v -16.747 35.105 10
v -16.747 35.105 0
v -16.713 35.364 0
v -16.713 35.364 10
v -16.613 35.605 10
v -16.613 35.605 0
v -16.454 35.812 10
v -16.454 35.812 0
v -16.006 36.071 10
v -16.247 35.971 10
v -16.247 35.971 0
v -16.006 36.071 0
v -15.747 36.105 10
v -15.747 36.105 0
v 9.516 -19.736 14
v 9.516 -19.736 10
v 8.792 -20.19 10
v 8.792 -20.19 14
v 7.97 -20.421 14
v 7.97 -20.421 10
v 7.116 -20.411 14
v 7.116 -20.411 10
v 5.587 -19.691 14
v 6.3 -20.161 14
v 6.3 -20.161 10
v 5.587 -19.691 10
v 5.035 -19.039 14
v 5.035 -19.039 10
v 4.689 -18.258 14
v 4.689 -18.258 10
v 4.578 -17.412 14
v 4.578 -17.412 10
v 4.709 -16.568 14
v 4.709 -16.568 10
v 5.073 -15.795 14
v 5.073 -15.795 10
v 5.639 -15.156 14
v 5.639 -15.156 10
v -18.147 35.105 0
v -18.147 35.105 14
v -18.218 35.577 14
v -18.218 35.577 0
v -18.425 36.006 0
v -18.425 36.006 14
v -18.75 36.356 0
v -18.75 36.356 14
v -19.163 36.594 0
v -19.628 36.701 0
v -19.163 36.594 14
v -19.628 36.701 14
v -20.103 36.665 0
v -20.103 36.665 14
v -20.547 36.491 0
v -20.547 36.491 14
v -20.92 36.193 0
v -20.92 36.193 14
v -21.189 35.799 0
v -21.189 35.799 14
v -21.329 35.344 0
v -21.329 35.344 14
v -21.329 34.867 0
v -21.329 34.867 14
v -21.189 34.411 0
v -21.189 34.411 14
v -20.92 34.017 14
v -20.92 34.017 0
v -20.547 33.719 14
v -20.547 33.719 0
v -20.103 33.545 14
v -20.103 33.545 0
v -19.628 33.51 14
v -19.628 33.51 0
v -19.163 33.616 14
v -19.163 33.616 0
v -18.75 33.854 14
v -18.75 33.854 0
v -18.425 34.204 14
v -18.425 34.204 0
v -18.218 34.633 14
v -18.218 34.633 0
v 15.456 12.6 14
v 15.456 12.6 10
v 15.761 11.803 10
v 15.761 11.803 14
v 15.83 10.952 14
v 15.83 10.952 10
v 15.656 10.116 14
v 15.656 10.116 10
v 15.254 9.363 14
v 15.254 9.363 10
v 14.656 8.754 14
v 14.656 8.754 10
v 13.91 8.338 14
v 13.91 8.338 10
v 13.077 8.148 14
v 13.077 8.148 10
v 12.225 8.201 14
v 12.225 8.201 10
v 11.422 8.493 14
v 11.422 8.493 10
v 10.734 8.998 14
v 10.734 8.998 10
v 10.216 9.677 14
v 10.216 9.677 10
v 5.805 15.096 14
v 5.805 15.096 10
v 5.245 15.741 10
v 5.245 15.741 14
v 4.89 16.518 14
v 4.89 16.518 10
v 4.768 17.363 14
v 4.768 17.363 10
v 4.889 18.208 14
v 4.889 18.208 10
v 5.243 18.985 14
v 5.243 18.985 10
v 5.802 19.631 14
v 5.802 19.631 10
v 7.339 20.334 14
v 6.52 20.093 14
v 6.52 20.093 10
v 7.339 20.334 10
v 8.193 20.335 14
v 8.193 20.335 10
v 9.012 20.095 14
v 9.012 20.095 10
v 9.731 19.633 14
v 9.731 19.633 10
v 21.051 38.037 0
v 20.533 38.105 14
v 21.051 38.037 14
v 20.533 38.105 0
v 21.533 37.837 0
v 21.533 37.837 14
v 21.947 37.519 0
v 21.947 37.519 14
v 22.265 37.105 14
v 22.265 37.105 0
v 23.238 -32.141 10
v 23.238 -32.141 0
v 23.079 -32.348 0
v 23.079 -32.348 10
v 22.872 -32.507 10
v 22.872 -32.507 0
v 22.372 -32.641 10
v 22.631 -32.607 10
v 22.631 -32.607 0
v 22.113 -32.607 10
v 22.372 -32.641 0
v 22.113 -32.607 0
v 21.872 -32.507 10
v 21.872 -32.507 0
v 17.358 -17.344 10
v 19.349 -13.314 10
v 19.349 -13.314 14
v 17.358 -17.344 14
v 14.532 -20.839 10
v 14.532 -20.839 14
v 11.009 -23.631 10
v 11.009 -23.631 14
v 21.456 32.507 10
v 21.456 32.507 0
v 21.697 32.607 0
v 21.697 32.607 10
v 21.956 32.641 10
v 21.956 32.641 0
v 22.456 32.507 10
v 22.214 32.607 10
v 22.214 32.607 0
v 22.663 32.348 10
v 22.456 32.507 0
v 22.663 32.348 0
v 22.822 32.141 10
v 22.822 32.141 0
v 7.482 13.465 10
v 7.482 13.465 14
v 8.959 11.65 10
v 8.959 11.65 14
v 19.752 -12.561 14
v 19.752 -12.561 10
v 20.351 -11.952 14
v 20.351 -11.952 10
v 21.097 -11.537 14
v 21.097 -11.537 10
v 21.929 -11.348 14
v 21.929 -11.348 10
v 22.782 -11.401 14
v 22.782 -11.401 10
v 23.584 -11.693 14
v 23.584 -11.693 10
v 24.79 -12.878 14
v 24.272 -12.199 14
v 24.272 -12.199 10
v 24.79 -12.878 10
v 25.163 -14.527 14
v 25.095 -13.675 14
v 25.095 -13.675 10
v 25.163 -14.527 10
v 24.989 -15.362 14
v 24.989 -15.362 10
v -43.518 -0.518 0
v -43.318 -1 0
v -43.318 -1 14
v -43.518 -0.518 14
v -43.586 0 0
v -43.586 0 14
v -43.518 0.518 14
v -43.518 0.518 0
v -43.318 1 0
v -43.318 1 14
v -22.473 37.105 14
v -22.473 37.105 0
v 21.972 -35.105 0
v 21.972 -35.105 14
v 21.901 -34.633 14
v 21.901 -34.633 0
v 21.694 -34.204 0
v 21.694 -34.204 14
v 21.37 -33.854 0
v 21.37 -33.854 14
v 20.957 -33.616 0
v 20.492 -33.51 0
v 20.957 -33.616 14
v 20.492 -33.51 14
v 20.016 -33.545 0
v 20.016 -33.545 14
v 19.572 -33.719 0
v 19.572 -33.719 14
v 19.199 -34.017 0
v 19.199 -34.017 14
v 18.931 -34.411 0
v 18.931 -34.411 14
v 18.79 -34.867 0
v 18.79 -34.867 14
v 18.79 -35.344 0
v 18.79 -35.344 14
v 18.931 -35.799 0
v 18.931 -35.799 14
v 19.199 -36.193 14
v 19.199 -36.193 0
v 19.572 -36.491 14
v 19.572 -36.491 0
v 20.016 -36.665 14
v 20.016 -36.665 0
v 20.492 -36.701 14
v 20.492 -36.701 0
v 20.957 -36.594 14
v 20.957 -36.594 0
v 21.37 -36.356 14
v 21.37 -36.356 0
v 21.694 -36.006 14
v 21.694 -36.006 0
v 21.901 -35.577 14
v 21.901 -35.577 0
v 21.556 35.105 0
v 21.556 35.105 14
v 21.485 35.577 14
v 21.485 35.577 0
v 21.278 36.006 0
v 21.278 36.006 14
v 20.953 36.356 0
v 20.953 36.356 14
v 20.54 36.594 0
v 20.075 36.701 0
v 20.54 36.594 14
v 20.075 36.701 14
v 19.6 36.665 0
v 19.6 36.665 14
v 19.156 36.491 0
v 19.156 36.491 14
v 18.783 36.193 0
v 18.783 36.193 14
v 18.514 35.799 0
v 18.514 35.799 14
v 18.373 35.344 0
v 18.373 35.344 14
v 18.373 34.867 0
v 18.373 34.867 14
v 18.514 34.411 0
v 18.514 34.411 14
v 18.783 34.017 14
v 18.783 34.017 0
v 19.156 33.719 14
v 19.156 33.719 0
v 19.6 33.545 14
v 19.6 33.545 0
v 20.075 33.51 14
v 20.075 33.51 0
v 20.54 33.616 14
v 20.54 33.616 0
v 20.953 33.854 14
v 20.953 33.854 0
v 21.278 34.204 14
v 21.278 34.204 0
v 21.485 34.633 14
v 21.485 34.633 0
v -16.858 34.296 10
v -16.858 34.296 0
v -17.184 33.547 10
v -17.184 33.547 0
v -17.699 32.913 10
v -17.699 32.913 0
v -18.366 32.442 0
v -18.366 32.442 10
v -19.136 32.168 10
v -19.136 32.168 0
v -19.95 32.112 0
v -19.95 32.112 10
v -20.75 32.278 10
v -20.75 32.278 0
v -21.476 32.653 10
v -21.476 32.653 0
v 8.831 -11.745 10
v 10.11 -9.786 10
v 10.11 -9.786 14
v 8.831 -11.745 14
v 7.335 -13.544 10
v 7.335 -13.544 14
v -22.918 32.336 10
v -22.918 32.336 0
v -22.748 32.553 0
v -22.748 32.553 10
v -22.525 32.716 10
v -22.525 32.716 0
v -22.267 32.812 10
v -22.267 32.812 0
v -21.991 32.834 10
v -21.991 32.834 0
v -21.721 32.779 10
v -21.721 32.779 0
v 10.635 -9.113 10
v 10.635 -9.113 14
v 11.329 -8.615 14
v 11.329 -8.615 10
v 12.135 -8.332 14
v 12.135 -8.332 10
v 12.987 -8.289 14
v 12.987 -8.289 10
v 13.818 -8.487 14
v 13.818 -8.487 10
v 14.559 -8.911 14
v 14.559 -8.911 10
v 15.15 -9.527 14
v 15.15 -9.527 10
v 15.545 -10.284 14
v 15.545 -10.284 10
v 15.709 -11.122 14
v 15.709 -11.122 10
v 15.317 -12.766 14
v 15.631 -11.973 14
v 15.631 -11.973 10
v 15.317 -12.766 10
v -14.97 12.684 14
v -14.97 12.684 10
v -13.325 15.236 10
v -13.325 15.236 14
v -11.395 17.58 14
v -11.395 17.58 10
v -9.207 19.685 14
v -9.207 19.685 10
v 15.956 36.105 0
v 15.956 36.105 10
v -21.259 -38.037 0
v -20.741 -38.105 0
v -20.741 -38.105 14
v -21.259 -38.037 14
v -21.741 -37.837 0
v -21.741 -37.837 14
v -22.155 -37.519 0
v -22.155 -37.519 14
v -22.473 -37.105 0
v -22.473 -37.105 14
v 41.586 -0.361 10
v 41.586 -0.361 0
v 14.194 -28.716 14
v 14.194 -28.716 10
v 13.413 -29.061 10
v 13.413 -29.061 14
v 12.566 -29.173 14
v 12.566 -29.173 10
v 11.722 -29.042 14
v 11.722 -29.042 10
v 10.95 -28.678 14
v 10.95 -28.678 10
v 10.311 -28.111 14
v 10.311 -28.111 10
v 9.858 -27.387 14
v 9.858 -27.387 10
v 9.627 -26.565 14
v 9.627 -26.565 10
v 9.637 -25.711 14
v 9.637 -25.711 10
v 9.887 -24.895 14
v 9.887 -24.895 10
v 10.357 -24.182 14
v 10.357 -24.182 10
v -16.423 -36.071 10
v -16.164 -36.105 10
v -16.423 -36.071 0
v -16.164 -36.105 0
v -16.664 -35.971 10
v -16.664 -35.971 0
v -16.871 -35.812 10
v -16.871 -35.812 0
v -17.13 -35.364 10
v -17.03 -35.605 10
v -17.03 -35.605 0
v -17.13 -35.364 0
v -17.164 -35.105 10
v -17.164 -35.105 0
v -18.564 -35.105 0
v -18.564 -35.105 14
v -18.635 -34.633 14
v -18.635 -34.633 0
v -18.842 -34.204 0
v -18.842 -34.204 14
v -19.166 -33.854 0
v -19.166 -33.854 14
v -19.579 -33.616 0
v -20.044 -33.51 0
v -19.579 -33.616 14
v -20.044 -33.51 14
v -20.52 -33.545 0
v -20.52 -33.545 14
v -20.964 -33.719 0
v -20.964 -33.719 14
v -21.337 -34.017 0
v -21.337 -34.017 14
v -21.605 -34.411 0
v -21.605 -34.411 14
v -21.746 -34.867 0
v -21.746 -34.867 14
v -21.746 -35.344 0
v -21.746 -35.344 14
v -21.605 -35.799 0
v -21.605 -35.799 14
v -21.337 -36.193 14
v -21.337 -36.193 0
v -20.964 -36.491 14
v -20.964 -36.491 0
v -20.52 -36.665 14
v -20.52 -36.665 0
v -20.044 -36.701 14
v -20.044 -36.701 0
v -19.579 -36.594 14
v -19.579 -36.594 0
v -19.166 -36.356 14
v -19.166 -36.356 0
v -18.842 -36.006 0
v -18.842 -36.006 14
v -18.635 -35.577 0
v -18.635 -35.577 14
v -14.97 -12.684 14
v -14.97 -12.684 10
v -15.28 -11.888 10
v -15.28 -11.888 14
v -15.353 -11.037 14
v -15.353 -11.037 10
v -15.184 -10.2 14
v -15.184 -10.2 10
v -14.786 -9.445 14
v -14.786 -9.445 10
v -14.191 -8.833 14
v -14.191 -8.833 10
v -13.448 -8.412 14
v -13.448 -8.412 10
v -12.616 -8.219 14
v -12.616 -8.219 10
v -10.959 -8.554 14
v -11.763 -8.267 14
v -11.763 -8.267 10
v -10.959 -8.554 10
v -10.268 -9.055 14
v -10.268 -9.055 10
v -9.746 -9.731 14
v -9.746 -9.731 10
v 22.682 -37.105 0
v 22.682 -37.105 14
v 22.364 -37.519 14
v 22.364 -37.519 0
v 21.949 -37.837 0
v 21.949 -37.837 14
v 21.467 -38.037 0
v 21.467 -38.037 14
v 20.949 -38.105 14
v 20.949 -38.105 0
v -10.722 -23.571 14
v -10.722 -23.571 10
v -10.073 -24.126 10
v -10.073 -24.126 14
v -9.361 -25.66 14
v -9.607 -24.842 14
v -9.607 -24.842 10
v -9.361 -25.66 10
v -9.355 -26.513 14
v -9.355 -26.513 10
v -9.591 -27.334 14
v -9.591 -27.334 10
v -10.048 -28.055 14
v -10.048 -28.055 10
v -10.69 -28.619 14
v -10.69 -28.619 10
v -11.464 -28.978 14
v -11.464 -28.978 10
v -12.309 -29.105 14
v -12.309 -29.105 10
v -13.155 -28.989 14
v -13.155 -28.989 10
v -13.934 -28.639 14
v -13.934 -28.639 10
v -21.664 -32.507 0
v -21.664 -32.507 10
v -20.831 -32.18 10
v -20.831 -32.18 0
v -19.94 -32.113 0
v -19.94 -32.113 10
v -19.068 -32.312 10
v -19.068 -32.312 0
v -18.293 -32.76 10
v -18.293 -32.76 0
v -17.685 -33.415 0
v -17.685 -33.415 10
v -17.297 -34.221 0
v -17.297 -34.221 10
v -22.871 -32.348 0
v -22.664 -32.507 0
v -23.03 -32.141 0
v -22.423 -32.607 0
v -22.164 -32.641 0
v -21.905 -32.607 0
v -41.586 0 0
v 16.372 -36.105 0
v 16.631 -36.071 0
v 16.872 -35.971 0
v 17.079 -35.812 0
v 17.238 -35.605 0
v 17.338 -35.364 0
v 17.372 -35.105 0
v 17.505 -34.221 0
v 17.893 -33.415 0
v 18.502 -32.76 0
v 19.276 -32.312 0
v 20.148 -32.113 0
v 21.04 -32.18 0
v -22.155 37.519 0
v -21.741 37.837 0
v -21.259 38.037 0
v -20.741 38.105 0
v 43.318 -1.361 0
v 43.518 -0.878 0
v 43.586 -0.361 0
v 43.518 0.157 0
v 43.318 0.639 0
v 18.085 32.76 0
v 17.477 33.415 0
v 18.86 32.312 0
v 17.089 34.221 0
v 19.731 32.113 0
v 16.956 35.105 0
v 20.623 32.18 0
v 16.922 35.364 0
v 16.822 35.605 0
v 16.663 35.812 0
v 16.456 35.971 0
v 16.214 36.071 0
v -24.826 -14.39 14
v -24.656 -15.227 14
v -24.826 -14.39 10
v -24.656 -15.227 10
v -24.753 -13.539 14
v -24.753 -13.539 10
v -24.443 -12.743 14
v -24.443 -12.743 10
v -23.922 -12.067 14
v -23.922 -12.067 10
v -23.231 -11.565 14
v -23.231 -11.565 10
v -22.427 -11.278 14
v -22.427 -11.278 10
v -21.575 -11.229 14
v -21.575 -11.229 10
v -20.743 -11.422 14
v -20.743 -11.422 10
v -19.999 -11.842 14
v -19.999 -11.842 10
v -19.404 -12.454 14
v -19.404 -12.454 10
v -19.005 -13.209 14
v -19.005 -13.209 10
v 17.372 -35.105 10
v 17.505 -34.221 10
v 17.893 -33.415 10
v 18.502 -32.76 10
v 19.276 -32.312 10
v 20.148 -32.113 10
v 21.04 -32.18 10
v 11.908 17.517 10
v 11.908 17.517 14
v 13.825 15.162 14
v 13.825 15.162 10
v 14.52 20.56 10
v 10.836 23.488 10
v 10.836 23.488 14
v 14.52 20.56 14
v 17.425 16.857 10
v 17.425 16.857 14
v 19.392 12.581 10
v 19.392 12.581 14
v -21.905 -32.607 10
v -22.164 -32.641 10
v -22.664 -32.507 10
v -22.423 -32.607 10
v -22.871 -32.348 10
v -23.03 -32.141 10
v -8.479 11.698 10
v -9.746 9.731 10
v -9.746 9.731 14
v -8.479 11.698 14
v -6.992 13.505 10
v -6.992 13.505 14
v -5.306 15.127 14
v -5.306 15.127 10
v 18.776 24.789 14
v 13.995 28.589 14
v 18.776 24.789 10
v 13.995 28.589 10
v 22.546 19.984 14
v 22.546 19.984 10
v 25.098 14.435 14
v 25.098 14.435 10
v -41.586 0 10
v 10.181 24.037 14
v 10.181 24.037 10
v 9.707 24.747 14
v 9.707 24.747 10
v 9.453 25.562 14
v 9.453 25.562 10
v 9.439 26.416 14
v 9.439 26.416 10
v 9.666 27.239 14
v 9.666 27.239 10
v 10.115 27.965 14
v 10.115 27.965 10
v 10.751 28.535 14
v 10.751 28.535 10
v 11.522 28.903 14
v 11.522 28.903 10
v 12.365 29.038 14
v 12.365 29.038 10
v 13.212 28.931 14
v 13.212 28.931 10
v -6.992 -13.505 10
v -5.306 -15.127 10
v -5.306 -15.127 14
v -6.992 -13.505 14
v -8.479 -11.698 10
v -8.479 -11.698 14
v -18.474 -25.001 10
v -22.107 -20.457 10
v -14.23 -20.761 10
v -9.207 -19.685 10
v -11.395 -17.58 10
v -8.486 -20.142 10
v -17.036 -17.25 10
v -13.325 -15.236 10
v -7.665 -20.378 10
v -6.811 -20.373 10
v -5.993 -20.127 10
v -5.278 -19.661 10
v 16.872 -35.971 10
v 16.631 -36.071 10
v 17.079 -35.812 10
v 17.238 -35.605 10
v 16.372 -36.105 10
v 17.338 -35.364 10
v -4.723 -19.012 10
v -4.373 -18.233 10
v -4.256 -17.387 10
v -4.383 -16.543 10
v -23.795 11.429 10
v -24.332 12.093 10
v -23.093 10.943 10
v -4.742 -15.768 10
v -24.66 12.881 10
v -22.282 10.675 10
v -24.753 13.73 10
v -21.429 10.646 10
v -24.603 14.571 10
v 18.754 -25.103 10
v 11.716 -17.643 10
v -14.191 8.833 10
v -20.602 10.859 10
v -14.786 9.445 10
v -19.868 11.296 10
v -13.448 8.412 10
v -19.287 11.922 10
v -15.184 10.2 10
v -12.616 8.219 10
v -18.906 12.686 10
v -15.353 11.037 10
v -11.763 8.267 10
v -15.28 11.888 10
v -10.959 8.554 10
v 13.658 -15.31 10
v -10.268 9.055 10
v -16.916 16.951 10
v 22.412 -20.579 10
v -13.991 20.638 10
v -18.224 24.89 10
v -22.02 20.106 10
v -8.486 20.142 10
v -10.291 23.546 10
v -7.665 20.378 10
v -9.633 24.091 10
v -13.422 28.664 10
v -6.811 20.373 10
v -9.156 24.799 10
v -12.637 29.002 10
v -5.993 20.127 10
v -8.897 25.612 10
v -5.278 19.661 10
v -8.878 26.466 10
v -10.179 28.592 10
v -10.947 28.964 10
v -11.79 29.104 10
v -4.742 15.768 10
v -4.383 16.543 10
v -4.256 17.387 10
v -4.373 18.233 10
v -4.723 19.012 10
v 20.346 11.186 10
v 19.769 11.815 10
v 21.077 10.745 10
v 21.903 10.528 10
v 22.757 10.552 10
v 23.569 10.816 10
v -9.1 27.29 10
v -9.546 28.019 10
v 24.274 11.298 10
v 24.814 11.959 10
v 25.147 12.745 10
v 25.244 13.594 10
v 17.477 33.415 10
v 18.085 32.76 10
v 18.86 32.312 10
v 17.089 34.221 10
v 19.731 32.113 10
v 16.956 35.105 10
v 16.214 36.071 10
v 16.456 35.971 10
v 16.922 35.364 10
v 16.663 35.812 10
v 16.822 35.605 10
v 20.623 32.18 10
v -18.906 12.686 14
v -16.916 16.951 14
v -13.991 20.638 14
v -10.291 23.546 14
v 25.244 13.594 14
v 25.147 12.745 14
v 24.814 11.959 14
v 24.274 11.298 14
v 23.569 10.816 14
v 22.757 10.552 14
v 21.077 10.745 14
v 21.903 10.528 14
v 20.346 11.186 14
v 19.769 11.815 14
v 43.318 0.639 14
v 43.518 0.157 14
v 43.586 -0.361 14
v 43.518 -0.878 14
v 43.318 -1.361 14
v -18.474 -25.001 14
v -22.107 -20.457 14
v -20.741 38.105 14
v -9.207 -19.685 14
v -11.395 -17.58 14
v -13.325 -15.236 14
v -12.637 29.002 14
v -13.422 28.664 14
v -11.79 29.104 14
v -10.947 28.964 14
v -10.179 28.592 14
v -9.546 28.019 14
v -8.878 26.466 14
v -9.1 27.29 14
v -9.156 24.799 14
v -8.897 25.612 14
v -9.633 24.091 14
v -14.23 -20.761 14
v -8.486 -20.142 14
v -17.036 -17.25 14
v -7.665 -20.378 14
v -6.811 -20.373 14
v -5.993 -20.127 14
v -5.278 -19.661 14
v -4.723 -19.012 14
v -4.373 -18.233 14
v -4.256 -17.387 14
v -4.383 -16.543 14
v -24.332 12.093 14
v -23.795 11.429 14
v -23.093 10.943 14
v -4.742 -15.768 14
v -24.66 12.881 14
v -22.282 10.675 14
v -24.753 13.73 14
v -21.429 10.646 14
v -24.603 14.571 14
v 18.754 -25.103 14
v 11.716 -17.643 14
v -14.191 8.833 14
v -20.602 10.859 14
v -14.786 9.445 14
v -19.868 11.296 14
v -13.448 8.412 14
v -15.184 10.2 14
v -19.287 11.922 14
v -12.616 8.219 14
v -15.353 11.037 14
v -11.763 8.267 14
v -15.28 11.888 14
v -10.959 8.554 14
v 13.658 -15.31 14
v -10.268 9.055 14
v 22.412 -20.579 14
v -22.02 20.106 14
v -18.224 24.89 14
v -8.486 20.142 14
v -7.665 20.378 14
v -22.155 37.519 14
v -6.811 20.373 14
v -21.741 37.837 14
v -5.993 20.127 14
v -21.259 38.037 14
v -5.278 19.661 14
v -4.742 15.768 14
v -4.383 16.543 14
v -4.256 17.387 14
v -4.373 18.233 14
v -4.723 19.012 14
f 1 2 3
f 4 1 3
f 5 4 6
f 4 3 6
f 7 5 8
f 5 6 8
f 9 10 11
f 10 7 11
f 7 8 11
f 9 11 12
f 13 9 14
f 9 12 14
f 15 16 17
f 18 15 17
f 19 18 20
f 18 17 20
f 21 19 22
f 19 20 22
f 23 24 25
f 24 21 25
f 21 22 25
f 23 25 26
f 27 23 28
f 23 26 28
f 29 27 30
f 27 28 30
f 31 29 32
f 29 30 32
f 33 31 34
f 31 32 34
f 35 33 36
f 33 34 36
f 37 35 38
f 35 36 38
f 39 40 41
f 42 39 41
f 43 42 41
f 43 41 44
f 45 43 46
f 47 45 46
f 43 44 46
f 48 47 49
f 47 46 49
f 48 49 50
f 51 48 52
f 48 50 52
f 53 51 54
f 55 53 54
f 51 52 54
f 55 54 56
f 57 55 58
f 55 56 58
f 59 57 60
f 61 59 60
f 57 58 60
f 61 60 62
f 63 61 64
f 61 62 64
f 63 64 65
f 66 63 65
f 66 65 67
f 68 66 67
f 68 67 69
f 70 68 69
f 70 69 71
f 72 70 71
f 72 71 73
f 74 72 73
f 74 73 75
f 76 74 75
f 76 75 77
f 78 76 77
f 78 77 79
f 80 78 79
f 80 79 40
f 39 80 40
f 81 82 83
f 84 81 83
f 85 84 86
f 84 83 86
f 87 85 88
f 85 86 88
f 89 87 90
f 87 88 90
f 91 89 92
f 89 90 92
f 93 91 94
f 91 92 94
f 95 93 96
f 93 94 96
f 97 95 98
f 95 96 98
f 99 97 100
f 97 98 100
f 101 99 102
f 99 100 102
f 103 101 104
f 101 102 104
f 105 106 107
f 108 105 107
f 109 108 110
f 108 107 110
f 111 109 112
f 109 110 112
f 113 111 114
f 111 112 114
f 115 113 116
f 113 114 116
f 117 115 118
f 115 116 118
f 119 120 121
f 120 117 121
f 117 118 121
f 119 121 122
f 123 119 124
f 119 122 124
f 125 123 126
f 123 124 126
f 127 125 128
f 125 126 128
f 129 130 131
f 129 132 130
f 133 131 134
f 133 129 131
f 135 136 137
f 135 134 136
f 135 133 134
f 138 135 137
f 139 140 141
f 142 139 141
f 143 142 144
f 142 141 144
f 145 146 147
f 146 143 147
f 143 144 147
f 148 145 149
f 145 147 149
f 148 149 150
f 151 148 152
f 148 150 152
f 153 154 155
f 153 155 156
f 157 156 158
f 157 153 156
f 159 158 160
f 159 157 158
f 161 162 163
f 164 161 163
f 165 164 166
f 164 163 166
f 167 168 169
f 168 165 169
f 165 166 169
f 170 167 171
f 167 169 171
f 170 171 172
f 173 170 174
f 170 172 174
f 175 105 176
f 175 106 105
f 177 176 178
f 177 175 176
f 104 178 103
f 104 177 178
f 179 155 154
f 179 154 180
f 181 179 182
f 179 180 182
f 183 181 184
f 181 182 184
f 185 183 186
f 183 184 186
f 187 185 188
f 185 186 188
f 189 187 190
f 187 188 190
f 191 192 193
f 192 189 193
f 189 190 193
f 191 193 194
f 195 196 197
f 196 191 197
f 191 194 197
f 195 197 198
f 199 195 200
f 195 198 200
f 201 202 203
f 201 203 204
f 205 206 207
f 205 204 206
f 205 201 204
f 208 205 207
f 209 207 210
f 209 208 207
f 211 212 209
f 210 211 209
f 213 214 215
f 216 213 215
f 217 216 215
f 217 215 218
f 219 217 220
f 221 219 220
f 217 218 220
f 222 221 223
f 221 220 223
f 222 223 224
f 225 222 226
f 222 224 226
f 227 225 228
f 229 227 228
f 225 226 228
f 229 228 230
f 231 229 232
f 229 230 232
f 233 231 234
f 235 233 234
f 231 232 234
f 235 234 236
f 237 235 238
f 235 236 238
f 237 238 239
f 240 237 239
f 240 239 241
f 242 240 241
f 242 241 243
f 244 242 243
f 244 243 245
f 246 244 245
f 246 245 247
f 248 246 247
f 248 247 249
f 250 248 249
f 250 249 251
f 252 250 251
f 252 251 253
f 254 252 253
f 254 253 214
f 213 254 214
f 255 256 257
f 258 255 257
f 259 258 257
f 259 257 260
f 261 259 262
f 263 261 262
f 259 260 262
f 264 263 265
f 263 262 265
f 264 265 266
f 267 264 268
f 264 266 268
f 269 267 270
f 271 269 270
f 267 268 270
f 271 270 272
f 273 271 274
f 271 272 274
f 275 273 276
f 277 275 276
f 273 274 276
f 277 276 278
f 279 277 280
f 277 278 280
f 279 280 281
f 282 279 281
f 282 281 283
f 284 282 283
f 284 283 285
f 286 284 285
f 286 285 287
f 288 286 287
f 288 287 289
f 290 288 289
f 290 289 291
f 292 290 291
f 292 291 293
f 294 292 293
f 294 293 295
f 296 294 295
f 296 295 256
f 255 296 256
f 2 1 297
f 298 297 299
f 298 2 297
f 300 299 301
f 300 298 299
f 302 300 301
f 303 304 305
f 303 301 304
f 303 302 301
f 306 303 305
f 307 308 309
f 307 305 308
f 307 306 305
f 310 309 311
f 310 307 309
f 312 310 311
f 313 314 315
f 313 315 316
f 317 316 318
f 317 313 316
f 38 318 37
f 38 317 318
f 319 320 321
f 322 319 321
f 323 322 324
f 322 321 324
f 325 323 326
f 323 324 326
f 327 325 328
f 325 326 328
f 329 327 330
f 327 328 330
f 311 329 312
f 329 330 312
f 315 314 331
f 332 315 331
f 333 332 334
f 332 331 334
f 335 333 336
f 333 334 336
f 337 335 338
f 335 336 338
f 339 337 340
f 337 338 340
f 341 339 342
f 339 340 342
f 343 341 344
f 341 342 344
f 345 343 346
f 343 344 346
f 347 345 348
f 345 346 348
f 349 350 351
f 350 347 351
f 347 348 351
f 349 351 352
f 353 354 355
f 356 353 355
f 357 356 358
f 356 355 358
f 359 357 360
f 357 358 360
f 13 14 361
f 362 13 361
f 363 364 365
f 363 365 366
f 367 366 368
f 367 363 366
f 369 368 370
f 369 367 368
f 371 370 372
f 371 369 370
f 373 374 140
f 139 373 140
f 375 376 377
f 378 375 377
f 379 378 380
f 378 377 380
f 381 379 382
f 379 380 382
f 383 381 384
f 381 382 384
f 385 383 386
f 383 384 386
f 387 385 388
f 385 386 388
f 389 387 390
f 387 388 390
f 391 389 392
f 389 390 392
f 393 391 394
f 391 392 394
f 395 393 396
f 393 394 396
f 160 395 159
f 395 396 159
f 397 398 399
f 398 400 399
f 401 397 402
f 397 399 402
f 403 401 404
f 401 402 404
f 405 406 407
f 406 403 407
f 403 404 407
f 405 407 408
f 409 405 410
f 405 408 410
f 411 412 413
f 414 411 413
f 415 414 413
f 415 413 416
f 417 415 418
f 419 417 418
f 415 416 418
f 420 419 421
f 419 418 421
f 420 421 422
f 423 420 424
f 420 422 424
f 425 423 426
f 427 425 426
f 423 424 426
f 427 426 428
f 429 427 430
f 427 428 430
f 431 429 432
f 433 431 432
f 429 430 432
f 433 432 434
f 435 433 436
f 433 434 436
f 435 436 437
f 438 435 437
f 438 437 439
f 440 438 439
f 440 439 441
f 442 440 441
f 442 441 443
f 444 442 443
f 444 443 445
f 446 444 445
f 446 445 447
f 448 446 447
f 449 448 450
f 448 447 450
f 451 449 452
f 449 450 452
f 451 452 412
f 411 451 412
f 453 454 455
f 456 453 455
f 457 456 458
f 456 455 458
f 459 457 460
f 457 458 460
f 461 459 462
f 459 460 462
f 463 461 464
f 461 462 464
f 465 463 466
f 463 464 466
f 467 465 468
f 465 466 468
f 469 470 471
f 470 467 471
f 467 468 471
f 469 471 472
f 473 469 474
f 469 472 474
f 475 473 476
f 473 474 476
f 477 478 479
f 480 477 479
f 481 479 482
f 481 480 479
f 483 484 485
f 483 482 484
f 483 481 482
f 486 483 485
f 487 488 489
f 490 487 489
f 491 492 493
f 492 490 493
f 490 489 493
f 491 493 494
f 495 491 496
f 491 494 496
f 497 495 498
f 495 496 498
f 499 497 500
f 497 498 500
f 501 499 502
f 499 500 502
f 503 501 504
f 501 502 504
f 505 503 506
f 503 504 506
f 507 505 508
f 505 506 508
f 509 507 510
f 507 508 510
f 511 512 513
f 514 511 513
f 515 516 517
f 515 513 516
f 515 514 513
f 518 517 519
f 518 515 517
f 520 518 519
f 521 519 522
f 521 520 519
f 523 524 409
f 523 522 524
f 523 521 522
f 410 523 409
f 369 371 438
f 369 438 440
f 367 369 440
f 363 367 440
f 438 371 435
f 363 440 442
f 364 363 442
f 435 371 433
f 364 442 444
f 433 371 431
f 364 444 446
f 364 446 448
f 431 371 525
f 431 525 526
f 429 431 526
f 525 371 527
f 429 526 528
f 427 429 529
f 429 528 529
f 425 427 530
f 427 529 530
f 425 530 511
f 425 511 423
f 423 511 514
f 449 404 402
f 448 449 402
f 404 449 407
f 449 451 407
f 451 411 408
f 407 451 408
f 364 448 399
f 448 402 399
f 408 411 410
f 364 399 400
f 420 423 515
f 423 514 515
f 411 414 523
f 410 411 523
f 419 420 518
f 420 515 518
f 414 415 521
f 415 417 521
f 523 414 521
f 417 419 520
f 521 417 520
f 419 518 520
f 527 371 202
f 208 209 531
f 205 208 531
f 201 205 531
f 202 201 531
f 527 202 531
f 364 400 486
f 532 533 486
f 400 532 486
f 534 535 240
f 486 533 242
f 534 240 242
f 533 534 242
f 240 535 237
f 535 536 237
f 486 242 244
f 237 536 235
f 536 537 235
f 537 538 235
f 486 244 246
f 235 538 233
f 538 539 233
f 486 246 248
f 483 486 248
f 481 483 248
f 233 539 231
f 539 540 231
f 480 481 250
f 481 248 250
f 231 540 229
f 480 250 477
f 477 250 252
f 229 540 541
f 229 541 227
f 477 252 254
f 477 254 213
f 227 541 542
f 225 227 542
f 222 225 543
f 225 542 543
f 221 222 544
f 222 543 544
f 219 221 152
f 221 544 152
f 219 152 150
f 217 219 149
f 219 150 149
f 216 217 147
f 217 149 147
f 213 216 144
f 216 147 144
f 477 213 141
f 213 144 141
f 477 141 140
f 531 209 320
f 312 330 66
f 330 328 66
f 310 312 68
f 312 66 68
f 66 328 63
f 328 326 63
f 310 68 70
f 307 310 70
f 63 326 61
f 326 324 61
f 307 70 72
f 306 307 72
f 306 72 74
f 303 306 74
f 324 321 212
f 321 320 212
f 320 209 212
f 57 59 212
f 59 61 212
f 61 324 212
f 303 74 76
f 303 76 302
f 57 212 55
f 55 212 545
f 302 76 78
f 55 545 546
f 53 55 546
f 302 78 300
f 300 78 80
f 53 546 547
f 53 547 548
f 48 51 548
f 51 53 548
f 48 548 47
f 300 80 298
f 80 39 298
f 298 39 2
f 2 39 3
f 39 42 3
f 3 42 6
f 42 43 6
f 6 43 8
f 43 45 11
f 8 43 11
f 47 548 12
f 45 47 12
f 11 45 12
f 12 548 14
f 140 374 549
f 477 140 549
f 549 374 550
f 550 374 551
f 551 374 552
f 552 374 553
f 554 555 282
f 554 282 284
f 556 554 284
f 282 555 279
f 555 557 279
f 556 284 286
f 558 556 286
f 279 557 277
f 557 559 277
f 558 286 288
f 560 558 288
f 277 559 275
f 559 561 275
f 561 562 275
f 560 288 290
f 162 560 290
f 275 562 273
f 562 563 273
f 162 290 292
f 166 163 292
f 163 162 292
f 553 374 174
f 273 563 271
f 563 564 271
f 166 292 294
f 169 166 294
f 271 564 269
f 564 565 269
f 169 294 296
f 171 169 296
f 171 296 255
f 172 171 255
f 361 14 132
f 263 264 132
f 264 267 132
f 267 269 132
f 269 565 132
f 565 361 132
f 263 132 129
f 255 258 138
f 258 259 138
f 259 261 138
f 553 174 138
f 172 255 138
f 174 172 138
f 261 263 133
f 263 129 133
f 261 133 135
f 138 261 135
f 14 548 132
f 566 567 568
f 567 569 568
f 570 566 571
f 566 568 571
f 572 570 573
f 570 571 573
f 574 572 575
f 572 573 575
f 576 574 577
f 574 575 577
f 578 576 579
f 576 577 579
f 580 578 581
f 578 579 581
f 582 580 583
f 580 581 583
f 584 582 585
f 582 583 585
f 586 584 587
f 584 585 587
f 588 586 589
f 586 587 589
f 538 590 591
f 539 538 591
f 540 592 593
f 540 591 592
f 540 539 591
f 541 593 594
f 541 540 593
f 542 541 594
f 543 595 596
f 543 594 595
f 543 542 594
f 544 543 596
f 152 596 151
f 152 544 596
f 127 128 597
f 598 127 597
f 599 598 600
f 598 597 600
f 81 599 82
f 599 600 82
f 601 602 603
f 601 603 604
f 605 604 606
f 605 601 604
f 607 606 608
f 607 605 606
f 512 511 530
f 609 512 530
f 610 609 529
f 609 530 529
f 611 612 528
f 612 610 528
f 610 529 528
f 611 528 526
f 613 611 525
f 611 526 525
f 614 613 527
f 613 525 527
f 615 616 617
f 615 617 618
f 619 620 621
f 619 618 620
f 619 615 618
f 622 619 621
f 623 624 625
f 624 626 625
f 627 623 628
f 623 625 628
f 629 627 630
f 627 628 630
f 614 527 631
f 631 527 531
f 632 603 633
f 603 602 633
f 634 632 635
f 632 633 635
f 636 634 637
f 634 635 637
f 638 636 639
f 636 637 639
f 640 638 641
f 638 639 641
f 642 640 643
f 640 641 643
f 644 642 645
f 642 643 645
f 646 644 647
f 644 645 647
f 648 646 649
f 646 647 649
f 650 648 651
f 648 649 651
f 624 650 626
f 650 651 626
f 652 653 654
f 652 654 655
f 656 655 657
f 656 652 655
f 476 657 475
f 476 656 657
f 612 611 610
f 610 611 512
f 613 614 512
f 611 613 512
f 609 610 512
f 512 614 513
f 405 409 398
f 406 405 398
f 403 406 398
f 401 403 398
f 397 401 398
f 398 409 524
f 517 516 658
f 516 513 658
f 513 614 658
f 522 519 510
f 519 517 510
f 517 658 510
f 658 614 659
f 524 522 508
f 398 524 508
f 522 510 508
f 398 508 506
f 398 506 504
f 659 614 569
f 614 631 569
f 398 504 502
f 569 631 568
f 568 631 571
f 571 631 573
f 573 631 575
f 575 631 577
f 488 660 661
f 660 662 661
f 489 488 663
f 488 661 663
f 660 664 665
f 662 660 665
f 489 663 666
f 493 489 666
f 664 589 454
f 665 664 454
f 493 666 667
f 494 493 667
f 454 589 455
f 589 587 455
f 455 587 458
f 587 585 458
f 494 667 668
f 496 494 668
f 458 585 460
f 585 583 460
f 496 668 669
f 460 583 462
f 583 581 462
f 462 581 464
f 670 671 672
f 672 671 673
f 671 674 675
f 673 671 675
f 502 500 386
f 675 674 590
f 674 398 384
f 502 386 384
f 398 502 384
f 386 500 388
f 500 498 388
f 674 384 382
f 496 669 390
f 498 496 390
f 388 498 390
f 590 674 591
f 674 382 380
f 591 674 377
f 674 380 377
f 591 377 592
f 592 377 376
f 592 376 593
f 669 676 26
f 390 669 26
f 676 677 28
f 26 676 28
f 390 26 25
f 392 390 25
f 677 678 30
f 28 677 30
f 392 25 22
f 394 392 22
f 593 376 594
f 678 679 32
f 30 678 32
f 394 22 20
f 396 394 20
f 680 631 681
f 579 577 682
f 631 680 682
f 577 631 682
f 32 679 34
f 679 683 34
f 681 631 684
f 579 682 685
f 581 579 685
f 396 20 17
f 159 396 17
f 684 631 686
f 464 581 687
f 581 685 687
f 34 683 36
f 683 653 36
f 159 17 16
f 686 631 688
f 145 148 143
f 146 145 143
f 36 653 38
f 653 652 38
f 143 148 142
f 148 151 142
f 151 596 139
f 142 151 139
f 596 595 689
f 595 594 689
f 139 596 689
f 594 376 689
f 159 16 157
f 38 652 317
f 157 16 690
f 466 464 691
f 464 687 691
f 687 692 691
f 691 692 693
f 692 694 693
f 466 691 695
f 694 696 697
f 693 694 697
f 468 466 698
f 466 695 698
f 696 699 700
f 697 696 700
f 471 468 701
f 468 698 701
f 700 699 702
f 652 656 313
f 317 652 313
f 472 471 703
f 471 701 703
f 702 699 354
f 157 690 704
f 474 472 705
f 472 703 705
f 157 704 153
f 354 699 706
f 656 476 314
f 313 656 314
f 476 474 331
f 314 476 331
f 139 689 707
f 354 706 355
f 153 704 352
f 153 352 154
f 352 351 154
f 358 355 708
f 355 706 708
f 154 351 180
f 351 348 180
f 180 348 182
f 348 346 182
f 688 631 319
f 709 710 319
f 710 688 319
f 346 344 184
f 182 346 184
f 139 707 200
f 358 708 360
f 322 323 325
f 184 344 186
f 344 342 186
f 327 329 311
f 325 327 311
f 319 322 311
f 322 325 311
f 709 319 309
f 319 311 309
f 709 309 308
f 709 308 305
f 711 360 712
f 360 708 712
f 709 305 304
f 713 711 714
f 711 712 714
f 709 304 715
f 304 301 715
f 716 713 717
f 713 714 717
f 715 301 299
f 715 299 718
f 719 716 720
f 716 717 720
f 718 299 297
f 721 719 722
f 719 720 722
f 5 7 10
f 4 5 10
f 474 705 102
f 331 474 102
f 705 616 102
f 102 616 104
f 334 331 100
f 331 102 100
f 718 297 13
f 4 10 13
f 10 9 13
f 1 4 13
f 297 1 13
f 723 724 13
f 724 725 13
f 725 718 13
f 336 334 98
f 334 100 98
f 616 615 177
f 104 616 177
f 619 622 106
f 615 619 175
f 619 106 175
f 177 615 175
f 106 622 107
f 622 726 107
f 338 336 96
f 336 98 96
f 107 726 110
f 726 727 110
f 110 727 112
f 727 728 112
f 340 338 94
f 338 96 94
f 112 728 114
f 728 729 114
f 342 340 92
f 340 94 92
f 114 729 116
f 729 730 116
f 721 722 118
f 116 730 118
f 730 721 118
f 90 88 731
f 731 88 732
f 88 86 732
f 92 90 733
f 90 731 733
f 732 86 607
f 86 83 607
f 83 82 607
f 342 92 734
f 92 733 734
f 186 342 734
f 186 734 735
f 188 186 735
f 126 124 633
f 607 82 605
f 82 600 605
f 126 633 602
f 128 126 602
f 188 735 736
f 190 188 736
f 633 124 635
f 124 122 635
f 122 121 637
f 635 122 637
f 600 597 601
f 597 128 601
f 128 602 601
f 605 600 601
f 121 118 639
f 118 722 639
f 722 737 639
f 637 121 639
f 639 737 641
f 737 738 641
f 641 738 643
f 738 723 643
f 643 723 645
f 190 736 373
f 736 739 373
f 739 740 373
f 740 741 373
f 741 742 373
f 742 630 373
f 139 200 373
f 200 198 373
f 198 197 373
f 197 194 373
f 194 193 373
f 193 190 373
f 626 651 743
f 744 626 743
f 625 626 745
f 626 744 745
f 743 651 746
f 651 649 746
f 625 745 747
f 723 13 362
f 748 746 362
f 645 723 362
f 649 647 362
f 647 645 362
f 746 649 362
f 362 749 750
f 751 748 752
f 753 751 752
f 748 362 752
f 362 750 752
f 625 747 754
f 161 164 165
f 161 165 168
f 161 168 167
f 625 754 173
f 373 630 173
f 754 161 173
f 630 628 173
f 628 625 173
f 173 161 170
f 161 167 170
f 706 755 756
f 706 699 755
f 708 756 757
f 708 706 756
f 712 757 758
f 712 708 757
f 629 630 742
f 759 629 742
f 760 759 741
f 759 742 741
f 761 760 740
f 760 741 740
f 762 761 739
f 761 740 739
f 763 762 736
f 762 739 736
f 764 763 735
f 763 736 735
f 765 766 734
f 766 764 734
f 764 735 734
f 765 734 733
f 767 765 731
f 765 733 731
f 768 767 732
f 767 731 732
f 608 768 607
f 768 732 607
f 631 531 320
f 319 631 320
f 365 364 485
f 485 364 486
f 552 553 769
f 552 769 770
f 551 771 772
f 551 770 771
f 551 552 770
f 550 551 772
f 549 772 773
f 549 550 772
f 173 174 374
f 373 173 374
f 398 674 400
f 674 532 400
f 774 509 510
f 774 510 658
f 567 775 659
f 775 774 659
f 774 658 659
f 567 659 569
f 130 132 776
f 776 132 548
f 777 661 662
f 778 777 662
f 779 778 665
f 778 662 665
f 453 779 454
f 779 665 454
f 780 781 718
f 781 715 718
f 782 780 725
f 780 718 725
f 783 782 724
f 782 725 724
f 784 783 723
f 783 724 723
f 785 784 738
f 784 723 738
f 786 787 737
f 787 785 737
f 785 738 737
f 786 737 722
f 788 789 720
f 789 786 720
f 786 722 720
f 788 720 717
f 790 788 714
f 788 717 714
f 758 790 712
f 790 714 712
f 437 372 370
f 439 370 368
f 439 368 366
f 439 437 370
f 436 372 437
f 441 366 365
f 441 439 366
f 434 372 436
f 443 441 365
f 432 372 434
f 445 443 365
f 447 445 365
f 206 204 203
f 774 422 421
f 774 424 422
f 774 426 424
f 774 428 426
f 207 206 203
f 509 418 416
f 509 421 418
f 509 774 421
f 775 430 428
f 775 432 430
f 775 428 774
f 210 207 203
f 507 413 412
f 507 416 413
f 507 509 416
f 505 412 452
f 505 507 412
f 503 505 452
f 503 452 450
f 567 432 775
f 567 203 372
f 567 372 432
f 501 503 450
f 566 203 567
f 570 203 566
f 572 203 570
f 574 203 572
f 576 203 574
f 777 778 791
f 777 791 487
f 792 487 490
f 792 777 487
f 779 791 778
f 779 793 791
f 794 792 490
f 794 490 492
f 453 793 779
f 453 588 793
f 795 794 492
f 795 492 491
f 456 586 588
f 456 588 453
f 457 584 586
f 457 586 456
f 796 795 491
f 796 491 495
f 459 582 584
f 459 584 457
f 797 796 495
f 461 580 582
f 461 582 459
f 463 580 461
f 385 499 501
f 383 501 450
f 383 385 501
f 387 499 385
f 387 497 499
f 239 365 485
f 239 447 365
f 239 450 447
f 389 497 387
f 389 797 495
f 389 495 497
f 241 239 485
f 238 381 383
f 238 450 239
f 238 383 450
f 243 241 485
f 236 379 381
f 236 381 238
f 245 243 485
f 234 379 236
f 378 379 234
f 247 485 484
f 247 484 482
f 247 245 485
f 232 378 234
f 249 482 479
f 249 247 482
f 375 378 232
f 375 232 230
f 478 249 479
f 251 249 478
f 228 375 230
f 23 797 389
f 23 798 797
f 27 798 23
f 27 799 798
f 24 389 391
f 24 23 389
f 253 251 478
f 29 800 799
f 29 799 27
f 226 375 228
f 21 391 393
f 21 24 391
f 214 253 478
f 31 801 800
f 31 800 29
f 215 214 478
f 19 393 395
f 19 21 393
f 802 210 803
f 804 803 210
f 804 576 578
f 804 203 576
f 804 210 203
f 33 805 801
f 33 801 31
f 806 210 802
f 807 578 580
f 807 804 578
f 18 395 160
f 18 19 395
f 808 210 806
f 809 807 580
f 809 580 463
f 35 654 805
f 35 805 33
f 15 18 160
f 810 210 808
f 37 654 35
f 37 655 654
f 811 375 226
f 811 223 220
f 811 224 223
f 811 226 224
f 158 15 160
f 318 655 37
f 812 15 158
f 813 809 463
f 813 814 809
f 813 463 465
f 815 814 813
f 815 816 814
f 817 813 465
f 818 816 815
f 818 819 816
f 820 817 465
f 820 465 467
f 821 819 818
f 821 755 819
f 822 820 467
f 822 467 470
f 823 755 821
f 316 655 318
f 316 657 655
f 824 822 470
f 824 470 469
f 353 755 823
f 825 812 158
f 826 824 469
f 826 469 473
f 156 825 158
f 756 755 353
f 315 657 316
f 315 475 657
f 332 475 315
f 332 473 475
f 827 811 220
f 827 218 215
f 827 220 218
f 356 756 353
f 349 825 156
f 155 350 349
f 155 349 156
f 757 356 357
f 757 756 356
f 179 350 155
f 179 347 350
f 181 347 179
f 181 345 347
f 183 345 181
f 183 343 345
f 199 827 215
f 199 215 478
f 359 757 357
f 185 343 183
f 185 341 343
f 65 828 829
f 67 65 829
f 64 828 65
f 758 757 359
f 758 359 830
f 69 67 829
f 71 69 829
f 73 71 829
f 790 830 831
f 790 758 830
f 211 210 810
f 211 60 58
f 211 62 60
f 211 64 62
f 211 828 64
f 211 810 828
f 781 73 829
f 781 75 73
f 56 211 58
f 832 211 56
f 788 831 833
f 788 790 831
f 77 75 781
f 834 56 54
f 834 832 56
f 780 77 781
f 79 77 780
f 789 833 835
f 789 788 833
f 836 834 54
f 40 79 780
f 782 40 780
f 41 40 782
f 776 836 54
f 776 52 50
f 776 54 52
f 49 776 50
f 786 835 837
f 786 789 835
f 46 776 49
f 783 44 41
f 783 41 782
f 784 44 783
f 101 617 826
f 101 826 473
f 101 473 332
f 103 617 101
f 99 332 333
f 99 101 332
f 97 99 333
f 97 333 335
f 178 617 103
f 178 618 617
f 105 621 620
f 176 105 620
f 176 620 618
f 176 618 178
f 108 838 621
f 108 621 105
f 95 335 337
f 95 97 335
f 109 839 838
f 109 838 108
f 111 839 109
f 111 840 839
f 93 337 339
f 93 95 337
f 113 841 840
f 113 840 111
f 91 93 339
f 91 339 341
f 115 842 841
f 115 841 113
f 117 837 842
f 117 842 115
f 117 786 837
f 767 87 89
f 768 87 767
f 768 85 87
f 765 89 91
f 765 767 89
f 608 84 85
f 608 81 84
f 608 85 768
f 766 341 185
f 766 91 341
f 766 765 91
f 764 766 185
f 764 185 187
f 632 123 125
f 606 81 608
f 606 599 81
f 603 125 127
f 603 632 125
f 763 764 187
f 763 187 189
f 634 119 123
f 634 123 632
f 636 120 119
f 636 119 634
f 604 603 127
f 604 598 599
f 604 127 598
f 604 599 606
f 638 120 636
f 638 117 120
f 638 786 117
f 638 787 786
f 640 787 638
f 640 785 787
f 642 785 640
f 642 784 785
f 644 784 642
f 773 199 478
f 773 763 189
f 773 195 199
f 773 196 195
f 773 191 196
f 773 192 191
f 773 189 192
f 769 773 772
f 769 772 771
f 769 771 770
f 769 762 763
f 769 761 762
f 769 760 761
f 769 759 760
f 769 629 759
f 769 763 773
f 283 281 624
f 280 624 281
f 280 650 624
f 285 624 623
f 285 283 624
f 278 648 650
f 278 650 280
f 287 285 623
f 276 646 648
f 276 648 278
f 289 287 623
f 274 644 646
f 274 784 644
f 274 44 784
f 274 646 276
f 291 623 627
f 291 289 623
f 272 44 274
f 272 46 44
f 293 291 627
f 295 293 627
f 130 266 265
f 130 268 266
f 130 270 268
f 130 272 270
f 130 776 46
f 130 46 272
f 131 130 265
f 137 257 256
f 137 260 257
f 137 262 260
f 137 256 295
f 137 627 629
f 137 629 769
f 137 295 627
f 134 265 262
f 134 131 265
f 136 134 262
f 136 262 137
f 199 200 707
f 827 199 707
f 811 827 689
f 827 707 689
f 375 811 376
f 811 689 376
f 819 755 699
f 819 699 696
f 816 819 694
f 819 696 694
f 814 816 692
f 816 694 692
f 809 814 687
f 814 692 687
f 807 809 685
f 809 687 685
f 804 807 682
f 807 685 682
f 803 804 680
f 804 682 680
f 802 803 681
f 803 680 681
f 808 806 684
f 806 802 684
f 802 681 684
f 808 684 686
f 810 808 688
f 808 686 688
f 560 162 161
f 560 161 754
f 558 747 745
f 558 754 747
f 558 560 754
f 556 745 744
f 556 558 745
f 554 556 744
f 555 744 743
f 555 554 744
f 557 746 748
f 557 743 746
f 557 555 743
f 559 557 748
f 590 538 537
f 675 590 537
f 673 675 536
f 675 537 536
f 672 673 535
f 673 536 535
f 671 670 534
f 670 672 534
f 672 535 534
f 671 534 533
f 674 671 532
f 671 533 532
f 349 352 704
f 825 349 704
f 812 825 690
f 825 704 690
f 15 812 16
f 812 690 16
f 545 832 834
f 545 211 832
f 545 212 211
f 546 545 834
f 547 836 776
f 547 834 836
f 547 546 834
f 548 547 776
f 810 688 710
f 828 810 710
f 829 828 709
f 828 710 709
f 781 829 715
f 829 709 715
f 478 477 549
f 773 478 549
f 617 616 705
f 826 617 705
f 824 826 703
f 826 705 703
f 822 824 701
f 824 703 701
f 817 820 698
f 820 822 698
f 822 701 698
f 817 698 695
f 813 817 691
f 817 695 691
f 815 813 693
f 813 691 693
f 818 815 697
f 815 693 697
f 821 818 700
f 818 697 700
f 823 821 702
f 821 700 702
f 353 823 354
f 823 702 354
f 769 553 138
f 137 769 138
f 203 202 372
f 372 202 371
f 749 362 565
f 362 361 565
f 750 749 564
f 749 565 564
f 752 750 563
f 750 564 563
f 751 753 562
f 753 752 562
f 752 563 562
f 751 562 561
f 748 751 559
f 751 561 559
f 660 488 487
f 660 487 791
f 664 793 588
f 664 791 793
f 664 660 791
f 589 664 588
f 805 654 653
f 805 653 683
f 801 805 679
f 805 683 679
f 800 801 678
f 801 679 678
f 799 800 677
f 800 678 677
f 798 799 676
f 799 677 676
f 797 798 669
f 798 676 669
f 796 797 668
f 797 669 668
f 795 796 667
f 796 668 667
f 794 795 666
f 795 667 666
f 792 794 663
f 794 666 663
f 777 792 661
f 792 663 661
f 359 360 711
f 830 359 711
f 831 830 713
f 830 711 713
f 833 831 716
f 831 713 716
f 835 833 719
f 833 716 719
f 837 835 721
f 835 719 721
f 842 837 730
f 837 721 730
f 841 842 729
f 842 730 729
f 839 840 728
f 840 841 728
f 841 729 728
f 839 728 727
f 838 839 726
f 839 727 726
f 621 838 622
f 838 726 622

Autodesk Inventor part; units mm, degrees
ref_plane "YZ Plane" through (0, 0, 0) normal (1, 0, 0) x (0, 1, 0)
ref_plane "XZ Plane" through (0, 0, 0) normal (0, 1, 0) x (-1, 0, 0)
ref_plane "XY Plane" through (0, 0, 0) normal (0, 0, 1) x (1, 0, 0)
sketch "Sketch1" plane through (0, 0, 0) normal (0, 0, 1) x (1, 0, 0)
  circle A0 centre (-20.1638, -35.1051) radius 1.25 projected
  circle A1 centre (19.9556, 35.1051) radius 1.25 projected
  circle A2 centre (20.3721, -35.1051) radius 1.25 projected
  circle A3 centre (-19.7473, 35.1051) radius 1.25 projected
  arc A4 (-17.1638, -35.1051) -> (-21.6638, -32.507) centre (-20.1638, -35.1051) ccw projected
  arc A5 (-23.0299, -32.141) -> (-21.6638, -32.507) centre (-22.1638, -31.641) ccw projected
  line L0 (-23.0299, -32.141) -> (-41.5865, 0) projected
  line L1 (-41.5865, 0) -> (-22.9176, 32.3355) projected
  arc A6 (-21.4755, 32.6529) -> (-22.9176, 32.3355) centre (-22.0516, 31.8355) ccw projected
  arc A7 (-21.4755, 32.6529) -> (-16.7473, 35.1051) centre (-19.7473, 35.1051) ccw projected
  arc A8 (-15.7473, 36.1051) -> (-16.7473, 35.1051) centre (-15.7473, 35.1051) ccw projected
  line L2 (-15.7473, 36.1051) -> (15.9556, 36.1051) projected
  arc A9 (16.9556, 35.1051) -> (15.9556, 36.1051) centre (15.9556, 35.1051) ccw projected
  arc A10 (16.9556, 35.1051) -> (21.4556, 32.507) centre (19.9556, 35.1051) ccw projected
  arc A11 (22.8216, 32.141) -> (21.4556, 32.507) centre (21.9556, 31.641) ccw projected
  line L3 (22.8216, 32.141) -> (41.5865, -0.3607) projected
  line L4 (41.5865, -0.3607) -> (23.2381, -32.141) projected
  arc A12 (21.8721, -32.507) -> (23.2381, -32.141) centre (22.3721, -31.641) ccw projected
  arc A13 (21.8721, -32.507) -> (17.3721, -35.1051) centre (20.3721, -35.1051) ccw projected
  arc A14 (16.3721, -36.1051) -> (17.3721, -35.1051) centre (16.3721, -35.1051) ccw projected
  line L5 (16.3721, -36.1051) -> (-16.1638, -36.1051) projected
  arc A15 (-17.1638, -35.1051) -> (-16.1638, -36.1051) centre (-16.1638, -35.1051) ccw projected
  line L6 (-43.3185, -1) -> (-22.4732, -37.1051) projected
  arc A16 (-22.4732, -37.1051) -> (-20.7412, -38.1051) centre (-20.7412, -36.1051) ccw projected
  line L7 (-20.7412, -38.1051) -> (20.9494, -38.1051) projected
  arc A17 (20.9494, -38.1051) -> (22.6815, -37.1051) centre (20.9494, -36.1051) ccw projected
  line L8 (22.6815, -37.1051) -> (43.3185, -1.3607) projected
  arc A18 (43.3185, -1.3607) -> (43.3185, 0.6393) centre (41.5865, -0.3607) ccw projected
  line L9 (43.3185, 0.6393) -> (22.265, 37.1051) projected
  arc A19 (22.265, 37.1051) -> (20.5329, 38.1051) centre (20.5329, 36.1051) ccw projected
  line L10 (20.5329, 38.1051) -> (-20.7412, 38.1051) projected
  arc A20 (-20.7412, 38.1051) -> (-22.4732, 37.1051) centre (-20.7412, 36.1051) ccw projected
  line L11 (-22.4732, 37.1051) -> (-43.3185, 1) projected
  arc A21 (-43.3185, 1) -> (-43.3185, -1) centre (-41.5865, 0) ccw projected
  point P0 (0, 0)
extrude "Extrusion1" add sketch "Sketch1" along normal blind 10
sketch "Sketch2" plane through (0, 0, 10) normal (0, 0, 1) x (1, 0, 0)
  arc A0 (19.392, 12.5813) -> (25.0985, 14.4351) centre (22.2452, 13.5082) ccw projected
  arc A1 (19.392, 12.5813) -> (10.8356, 23.4883) centre (0.2256, 6.3551) ccw projected
  arc A2 (13.9946, 28.5893) -> (10.8356, 23.4883) centre (12.4151, 26.0388) ccw projected
  arc A3 (25.0985, 14.4351) -> (13.9946, 28.5893) centre (0.2256, 6.3551) ccw projected
  arc A4 (-19.0054, -13.2092) -> (-24.656, -15.2268) centre (-21.8307, -14.218) ccw projected
  arc A5 (-19.0054, -13.2092) -> (-10.7215, -23.5712) centre (0.1909, -6.3551) ccw projected
  arc A6 (-13.9337, -28.639) -> (-10.7215, -23.5712) centre (-12.3276, -26.1051) ccw projected
  arc A7 (-24.656, -15.2268) -> (-13.9337, -28.639) centre (0.1909, -6.3551) ccw projected
  arc A8 (10.216, 9.6769) -> (15.4555, 12.6005) centre (12.8358, 11.1387) ccw projected
  arc A9 (10.216, 9.6769) -> (5.8047, 15.0962) centre (-7.382, -0.1428) ccw projected
  arc A10 (9.7308, 19.6334) -> (5.8047, 15.0962) centre (7.7677, 17.3648) ccw projected
  arc A11 (15.4555, 12.6005) -> (9.7308, 19.6334) centre (-7.382, -0.1428) ccw projected
  arc A12 (-5.3056, 15.1266) -> (-9.2069, 19.6851) centre (-7.2562, 17.4058) ccw projected
  arc A13 (-5.3056, 15.1266) -> (-9.7465, 9.7314) centre (7.7976, -0.1843) ccw projected
  arc A14 (-14.9699, 12.6837) -> (-9.7465, 9.7314) centre (-12.3582, 11.2076) ccw projected
  arc A15 (-9.2069, 19.6851) -> (-14.9699, 12.6837) centre (7.7976, -0.1843) ccw projected
  arc A16 (-9.7465, -9.7314) -> (-14.9699, -12.6837) centre (-12.3582, -11.2076) ccw projected
  arc A17 (-9.7465, -9.7314) -> (-5.3056, -15.1266) centre (7.7976, 0.1843) ccw projected
  arc A18 (-9.2069, -19.6851) -> (-5.3056, -15.1266) centre (-7.2562, -17.4058) ccw projected
  arc A19 (-14.9699, -12.6837) -> (-9.2069, -19.6851) centre (7.7976, 0.1843) ccw projected
  arc A20 (5.6394, -15.1565) -> (9.5156, -19.7363) centre (7.5775, -17.4464) ccw projected
  arc A21 (5.6394, -15.1565) -> (10.1097, -9.7857) centre (-7.3799, 0.2258) ccw projected
  arc A22 (15.3169, -12.7664) -> (10.1097, -9.7857) centre (12.7133, -11.2761) ccw projected
  arc A23 (9.5156, -19.7363) -> (15.3169, -12.7664) centre (-7.3799, 0.2258) ccw projected
  arc A24 (11.009, -23.6306) -> (14.1935, -28.7158) centre (12.6012, -26.1732) ccw projected
  arc A25 (11.009, -23.6306) -> (19.3494, -13.314) centre (0.1909, -6.3551) ccw projected
  arc A26 (24.9889, -15.3625) -> (19.3494, -13.314) centre (22.1691, -14.3383) ccw projected
  arc A27 (14.1935, -28.7158) -> (24.9889, -15.3625) centre (0.1909, -6.3551) ccw projected
  arc A28 (-10.2906, 23.546) -> (-13.4216, 28.6643) centre (-11.8561, 26.1051) ccw projected
  arc A29 (-10.2906, 23.546) -> (-18.9065, 12.686) centre (0.2256, 6.3551) ccw projected
  arc A30 (-24.6027, 14.5709) -> (-18.9065, 12.686) centre (-21.7546, 13.6284) ccw projected
  arc A31 (-13.4216, 28.6643) -> (-24.6027, 14.5709) centre (0.2256, 6.3551) ccw projected
  circle A32 centre (-19.7473, 35.1051) radius 1.25 construction
  circle A33 centre (20.3721, -35.1051) radius 1.25 construction
  circle A34 centre (19.9556, 35.1051) radius 1.25 construction
  circle A35 centre (-20.1638, -35.1051) radius 1.25 construction
  line L0 (-43.1103, 0.6393) -> (-22.0567, 37.1051) construction
  arc A36 (-43.1103, 0.6393) -> (-43.1103, -1.3607) centre (-41.3782, -0.3607) ccw construction
  line L1 (-22.4732, -37.1051) -> (-43.1103, -1.3607) construction
  arc A37 (-22.4732, -37.1051) -> (-20.7412, -38.1051) centre (-20.7412, -36.1051) ccw construction
  line L2 (20.9494, -38.1051) -> (-20.7412, -38.1051) construction
  arc A38 (20.9494, -38.1051) -> (22.6815, -37.1051) centre (20.9494, -36.1051) ccw construction
  line L3 (43.5268, -1) -> (22.6815, -37.1051) construction
  arc A39 (43.5268, -1) -> (43.5268, 1) centre (41.7947, 0) ccw construction
  line L4 (22.6815, 37.1051) -> (43.5268, 1) construction
  arc A40 (22.6815, 37.1051) -> (20.9494, 38.1051) centre (20.9494, 36.1051) ccw construction
  line L5 (-20.3247, 38.1051) -> (20.9494, 38.1051) construction
  arc A41 (-20.3247, 38.1051) -> (-22.0567, 37.1051) centre (-20.3247, 36.1051) ccw construction
  arc A42 (-22.4732, -37.1051) -> (-20.7412, -38.1051) centre (-20.7412, -36.1051) ccw projected
  line L6 (-20.7412, -38.1051) -> (20.9494, -38.1051) projected
  arc A43 (20.9494, -38.1051) -> (22.6815, -37.1051) centre (20.9494, -36.1051) ccw projected
  line L7 (22.6815, -37.1051) -> (43.3185, -1.3607) projected
  arc A44 (43.3185, -1.3607) -> (43.3185, 0.6393) centre (41.5865, -0.3607) ccw projected
  line L8 (43.3185, 0.6393) -> (22.265, 37.1051) projected
  arc A45 (22.265, 37.1051) -> (20.5329, 38.1051) centre (20.5329, 36.1051) ccw projected
  line L9 (20.5329, 38.1051) -> (-20.7412, 38.1051) projected
  arc A46 (-20.7412, 38.1051) -> (-22.4732, 37.1051) centre (-20.7412, 36.1051) ccw projected
  line L10 (-22.4732, 37.1051) -> (-43.3185, 1) projected
  arc A47 (-43.3185, 1) -> (-43.3185, -1) centre (-41.5865, 0) ccw projected
  line L11 (-43.3185, -1) -> (-22.4732, -37.1051) projected
  line L12 (16.3721, -36.1051) -> (-16.1638, -36.1051) projected
  arc A48 (-17.1638, -35.1051) -> (-16.1638, -36.1051) centre (-16.1638, -35.1051) ccw projected
  arc A49 (-17.1638, -35.1051) -> (-21.6638, -32.507) centre (-20.1638, -35.1051) ccw projected
  arc A50 (-23.0299, -32.141) -> (-21.6638, -32.507) centre (-22.1638, -31.641) ccw projected
  line L13 (-23.0299, -32.141) -> (-41.5865, 0) projected
  line L14 (-41.5865, 0) -> (-22.9176, 32.3355) projected
  arc A51 (-21.4755, 32.6529) -> (-22.9176, 32.3355) centre (-22.0516, 31.8355) ccw projected
  arc A52 (-21.4755, 32.6529) -> (-16.7473, 35.1051) centre (-19.7473, 35.1051) ccw projected
  arc A53 (-15.7473, 36.1051) -> (-16.7473, 35.1051) centre (-15.7473, 35.1051) ccw projected
  line L15 (-15.7473, 36.1051) -> (15.9556, 36.1051) projected
  arc A54 (16.9556, 35.1051) -> (15.9556, 36.1051) centre (15.9556, 35.1051) ccw projected
  arc A55 (16.9556, 35.1051) -> (21.4556, 32.507) centre (19.9556, 35.1051) ccw projected
  arc A56 (22.8216, 32.141) -> (21.4556, 32.507) centre (21.9556, 31.641) ccw projected
  line L16 (22.8216, 32.141) -> (41.5865, -0.3607) projected
  line L17 (41.5865, -0.3607) -> (23.2381, -32.141) projected
  arc A57 (21.8721, -32.507) -> (23.2381, -32.141) centre (22.3721, -31.641) ccw projected
  arc A58 (21.8721, -32.507) -> (17.3721, -35.1051) centre (20.3721, -35.1051) ccw projected
  arc A59 (16.3721, -36.1051) -> (17.3721, -35.1051) centre (16.3721, -35.1051) ccw projected
  circle A60 centre (-19.7473, 35.1051) radius 1.25 projected
  circle A61 centre (20.3721, -35.1051) radius 1.25 projected
  circle A62 centre (19.9556, 35.1051) radius 1.25 projected
  circle A63 centre (-20.1638, -35.1051) radius 1.25 projected
  point P0 (0, 0)
  dimension "d4" = 2.5
extrude "Extrusion2" add sketch "Sketch2" along normal blind 4 contours L11 A47 L10 A46 L9 A45 L8 A44 L7 A43 L6 A42 | L12 A48 A49 A50 L13 L14 A51 A52 A53 L15 A54 A55 A56 L16 L17 A57 A58 A59
sketch "Sketch3" plane through (0, 0, 14) normal (0, 0, 1) x (1, 0, 0)
  circle A0 centre (-19.7473, 35.1051) radius 1.25 construction
  circle A1 centre (19.9556, 35.1051) radius 1.25 construction
  circle A2 centre (-20.1638, -35.1051) radius 1.25 construction
  circle A3 centre (20.3721, -35.1051) radius 1.25 construction
  circle A4 centre (-19.7473, 35.1051) radius 1.6
  circle A5 centre (19.9556, 35.1051) radius 1.6
  circle A6 centre (-20.1638, -35.1051) radius 1.6
  circle A7 centre (20.3721, -35.1051) radius 1.6
  point P0 (0, 0)
  dimension "d5" = 3.2
extrude "Extrusion3" cut sketch "Sketch3" against normal through all
properties part number "ArmPowerBoardBack"
